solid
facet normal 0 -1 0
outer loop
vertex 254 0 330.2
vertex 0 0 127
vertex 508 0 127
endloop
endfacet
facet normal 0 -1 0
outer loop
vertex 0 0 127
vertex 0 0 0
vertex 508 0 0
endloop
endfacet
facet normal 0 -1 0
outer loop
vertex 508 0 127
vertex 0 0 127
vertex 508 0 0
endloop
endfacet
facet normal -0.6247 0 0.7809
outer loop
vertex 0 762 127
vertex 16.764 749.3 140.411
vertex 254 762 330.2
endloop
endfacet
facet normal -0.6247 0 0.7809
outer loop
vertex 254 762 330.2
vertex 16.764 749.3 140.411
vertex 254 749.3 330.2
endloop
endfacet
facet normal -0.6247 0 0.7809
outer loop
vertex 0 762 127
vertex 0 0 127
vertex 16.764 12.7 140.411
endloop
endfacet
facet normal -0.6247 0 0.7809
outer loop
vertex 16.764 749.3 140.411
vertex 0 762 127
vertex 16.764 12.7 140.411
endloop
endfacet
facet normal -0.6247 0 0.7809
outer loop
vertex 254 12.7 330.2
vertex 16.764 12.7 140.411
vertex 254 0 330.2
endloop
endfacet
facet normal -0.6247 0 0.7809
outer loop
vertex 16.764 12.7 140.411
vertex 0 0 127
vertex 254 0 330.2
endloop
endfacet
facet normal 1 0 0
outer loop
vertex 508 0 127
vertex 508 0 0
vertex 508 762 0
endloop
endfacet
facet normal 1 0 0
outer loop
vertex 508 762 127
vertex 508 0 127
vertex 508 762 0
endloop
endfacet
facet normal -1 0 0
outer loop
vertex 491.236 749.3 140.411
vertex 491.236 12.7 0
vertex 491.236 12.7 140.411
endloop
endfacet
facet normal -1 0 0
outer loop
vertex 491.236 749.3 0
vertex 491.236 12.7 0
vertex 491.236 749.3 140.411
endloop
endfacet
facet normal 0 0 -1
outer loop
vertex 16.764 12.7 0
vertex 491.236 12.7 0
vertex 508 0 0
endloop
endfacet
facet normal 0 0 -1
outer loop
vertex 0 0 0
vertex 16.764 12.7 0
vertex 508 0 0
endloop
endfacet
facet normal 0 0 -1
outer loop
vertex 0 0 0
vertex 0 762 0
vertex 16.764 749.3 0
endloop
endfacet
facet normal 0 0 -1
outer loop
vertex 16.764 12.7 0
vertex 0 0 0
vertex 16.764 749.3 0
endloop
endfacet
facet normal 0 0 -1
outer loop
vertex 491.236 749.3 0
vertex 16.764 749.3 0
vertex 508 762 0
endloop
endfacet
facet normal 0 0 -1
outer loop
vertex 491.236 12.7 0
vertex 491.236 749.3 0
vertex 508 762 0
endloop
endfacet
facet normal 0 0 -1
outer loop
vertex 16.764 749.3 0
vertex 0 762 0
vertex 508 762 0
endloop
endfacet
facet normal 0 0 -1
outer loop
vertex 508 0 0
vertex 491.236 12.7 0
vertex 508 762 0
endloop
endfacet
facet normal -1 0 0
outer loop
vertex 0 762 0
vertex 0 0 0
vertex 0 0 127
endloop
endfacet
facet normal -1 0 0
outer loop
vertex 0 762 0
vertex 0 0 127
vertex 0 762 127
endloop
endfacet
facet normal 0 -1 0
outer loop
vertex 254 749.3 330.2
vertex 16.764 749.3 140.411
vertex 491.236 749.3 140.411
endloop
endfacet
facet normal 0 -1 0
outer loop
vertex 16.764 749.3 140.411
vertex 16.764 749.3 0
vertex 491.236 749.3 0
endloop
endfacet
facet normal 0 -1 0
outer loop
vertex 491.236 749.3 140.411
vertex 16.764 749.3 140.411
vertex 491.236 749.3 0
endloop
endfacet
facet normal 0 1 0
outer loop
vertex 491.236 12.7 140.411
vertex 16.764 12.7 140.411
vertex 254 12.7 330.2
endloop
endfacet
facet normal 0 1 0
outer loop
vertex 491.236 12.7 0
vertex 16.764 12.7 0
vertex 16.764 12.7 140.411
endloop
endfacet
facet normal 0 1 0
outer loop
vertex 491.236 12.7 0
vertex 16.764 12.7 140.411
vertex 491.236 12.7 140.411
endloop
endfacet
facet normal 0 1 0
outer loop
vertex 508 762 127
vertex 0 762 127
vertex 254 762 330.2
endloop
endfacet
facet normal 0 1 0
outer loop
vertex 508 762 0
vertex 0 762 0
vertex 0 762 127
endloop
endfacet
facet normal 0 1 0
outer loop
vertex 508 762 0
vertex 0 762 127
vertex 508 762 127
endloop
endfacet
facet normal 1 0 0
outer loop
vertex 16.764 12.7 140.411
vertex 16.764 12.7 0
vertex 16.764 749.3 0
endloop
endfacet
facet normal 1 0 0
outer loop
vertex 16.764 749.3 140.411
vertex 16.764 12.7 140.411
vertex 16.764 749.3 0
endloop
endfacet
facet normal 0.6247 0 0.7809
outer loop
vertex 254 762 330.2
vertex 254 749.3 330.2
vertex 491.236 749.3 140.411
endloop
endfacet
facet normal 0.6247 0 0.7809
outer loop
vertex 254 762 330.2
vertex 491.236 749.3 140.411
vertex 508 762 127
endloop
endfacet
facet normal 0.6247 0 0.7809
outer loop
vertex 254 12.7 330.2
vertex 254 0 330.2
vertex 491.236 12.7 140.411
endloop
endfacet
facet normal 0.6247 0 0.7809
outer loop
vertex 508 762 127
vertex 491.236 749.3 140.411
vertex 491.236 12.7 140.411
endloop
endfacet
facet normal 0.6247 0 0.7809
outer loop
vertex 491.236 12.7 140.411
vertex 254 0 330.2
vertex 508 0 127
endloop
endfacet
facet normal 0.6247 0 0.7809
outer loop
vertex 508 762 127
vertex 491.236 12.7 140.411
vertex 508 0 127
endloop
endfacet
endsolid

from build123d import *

# Parameters (mm, degrees)
F0_W     = 508
F0_H     = 762
F0_W_2   = 474.472
F0_H_2   = 736.6
F1_DEPTH = 330.2
F3_DEPTH = 762.001


with BuildPart() as f1:
    # F0 (on Top) → F1 (new body)
    with BuildSketch(Plane.XY):
        with Locations((254, 381)):
            Rectangle(F0_W, F0_H)
        with Locations((254, 381)):
            Rectangle(F0_W_2, F0_H_2, mode=Mode.SUBTRACT)
    extrude(amount=F1_DEPTH)

    # F2 (on Front) → F3 (cut, through all)
    with BuildSketch(Plane.XZ):
        Polygon((0, 330.2), (0, 127), (254, 330.2), align=None)
        Polygon((508, 330.2), (254, 330.2), (508, 127), align=None)
    extrude(amount=-F3_DEPTH, mode=Mode.SUBTRACT)


solid = f1.part
